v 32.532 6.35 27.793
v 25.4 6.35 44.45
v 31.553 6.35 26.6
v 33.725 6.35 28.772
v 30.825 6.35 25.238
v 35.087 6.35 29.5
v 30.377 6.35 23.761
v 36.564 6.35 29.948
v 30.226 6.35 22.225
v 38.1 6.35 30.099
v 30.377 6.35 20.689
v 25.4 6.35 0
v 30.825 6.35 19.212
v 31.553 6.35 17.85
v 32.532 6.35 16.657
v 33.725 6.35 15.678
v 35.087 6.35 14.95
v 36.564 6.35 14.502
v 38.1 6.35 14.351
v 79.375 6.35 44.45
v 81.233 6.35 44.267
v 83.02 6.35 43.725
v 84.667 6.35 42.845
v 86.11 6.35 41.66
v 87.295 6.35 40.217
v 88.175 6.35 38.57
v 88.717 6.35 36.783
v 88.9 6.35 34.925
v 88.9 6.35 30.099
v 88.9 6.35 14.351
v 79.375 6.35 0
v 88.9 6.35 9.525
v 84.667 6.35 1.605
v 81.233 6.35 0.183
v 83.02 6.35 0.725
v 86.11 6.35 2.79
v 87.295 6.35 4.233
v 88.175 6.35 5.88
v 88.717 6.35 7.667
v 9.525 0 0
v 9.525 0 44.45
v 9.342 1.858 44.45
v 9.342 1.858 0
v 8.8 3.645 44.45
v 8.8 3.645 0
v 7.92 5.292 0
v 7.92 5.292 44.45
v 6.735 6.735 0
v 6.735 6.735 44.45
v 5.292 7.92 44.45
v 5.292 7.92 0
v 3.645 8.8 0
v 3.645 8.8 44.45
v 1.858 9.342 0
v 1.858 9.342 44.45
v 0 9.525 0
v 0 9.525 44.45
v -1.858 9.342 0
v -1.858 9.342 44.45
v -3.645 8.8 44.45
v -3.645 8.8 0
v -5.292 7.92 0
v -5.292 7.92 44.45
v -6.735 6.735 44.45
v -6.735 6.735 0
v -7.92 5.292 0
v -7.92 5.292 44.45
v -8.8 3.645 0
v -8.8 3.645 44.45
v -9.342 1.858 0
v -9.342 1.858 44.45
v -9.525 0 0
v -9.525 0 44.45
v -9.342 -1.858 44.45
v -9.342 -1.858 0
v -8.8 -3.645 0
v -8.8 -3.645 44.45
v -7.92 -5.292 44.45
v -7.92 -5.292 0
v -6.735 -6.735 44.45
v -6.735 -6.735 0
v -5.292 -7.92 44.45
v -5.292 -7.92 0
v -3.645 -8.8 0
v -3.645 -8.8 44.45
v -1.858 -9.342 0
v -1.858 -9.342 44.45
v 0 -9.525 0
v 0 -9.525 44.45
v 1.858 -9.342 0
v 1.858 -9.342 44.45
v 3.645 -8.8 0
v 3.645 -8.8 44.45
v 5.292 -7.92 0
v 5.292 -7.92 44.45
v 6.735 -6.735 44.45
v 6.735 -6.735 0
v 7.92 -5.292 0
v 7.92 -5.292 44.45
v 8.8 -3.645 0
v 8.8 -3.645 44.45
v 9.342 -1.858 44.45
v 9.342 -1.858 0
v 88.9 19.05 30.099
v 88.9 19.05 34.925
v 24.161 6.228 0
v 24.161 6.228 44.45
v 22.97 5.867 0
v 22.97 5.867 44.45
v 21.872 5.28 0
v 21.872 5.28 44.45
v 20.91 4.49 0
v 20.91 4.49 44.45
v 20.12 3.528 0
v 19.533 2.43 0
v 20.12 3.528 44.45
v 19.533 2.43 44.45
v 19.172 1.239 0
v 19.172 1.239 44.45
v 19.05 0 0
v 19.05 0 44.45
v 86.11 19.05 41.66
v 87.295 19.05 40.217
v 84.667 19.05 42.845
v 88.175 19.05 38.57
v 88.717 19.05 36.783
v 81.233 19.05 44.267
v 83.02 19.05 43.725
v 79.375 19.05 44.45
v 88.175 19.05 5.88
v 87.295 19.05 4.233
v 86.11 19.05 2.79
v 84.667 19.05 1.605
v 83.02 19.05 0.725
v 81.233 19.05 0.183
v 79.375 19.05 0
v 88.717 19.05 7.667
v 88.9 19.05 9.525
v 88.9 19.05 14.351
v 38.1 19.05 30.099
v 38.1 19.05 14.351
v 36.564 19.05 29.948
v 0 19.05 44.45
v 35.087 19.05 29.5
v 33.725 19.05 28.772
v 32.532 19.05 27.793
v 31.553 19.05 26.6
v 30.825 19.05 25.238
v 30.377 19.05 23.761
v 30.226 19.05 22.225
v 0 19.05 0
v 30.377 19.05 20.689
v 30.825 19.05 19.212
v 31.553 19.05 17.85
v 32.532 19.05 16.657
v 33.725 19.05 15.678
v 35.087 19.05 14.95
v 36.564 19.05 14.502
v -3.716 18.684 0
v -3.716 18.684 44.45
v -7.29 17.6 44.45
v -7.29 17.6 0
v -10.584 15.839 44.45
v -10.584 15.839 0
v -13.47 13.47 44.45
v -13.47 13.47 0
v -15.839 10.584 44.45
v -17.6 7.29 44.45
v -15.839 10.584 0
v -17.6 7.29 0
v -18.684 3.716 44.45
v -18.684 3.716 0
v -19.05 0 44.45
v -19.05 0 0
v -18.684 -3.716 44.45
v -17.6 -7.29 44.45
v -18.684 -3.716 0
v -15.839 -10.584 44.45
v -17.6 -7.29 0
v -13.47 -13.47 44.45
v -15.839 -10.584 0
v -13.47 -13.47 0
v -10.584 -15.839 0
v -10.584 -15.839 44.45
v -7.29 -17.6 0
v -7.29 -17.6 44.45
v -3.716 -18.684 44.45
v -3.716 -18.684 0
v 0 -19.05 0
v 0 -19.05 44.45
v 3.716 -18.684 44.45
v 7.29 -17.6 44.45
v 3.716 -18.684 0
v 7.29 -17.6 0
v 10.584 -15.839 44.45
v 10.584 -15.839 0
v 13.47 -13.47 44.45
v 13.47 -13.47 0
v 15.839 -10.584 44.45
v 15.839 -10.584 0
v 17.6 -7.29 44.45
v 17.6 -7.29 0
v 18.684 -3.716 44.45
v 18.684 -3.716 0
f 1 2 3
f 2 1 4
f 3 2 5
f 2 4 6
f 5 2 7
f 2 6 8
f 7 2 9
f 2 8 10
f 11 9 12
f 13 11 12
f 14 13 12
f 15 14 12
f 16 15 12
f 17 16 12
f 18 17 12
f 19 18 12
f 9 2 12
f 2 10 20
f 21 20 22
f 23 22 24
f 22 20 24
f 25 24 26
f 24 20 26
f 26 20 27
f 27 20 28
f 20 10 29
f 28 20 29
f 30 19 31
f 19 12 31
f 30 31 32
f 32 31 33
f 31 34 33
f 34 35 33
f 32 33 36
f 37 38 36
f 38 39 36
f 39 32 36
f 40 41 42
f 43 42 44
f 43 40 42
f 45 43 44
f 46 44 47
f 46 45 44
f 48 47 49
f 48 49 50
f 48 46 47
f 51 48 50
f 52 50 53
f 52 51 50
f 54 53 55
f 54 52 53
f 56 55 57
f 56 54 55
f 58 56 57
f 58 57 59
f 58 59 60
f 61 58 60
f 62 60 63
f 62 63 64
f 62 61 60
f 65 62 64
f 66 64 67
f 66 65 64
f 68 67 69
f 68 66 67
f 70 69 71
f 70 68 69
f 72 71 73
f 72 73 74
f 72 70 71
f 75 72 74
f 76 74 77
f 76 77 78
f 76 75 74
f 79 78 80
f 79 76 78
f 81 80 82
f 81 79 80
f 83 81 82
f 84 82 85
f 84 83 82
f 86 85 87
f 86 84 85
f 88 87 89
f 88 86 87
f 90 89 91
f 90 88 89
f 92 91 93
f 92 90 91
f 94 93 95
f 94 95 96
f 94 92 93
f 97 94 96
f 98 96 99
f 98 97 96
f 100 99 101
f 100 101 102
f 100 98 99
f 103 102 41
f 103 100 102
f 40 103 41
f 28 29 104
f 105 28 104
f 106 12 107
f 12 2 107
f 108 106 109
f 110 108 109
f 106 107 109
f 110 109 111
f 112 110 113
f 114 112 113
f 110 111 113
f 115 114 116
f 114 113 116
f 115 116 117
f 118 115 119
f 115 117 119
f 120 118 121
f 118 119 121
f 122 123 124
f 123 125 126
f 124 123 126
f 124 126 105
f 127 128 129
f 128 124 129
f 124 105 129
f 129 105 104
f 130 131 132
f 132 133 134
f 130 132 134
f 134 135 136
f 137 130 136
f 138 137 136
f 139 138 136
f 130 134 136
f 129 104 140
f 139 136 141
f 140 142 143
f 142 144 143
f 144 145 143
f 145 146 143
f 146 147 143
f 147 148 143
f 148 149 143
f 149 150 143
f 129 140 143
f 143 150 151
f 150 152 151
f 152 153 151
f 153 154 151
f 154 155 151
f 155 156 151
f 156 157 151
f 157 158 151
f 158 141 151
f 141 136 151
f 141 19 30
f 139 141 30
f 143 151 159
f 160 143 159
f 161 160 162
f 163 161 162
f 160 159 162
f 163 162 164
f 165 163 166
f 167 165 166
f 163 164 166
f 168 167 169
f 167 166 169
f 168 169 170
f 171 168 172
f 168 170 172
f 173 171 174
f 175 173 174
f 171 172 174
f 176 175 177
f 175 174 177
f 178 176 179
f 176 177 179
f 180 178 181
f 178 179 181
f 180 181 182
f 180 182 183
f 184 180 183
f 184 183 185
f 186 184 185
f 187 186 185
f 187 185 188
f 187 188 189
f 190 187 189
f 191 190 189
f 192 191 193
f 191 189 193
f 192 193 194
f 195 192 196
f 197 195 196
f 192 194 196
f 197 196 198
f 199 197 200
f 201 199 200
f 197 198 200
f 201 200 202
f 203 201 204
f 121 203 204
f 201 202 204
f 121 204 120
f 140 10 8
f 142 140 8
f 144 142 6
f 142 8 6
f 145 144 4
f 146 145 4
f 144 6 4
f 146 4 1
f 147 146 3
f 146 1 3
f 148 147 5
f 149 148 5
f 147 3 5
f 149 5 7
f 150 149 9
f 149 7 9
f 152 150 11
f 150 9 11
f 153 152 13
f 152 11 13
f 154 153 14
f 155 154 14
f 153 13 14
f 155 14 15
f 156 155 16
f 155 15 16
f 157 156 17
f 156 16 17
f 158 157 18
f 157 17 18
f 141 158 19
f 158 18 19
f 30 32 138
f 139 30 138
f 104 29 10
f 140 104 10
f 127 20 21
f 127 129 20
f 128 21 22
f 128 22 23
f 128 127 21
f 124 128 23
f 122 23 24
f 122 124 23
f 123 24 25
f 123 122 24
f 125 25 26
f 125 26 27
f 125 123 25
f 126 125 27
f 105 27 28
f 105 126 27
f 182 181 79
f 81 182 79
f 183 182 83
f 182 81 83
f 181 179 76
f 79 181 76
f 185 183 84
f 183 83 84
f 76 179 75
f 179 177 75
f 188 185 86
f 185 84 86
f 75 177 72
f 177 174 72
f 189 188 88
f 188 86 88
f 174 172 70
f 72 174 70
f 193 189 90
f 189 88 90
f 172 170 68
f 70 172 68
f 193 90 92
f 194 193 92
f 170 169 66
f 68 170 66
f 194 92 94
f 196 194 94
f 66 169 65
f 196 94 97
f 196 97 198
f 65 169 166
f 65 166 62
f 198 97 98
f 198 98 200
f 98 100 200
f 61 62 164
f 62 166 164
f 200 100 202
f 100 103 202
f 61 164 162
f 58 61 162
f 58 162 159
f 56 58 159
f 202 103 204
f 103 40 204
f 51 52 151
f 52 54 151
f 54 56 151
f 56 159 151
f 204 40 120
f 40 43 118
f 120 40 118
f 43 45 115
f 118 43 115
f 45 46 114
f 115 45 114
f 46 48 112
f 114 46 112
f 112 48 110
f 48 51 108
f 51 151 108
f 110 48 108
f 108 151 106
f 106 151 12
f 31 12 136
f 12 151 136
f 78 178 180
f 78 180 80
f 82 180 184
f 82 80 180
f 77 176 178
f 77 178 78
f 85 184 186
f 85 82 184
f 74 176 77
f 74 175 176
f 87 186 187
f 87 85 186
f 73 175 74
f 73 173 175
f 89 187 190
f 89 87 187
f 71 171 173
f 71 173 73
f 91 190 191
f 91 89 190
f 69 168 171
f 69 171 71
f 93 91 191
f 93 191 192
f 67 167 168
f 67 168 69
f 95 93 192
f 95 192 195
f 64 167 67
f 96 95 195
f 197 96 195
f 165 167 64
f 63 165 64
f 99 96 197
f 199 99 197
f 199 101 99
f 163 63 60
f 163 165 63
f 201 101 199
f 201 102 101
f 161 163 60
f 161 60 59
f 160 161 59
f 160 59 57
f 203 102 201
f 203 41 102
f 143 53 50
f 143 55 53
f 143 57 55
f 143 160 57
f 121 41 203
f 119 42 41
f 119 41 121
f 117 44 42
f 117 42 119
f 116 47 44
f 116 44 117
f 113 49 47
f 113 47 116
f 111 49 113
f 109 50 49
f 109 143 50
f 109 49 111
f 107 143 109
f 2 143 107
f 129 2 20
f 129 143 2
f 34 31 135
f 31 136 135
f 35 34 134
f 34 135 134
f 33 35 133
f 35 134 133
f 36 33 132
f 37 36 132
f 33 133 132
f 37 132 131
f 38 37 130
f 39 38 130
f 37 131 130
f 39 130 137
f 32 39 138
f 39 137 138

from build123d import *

# Parameters (mm, degrees)
F0_R     = 9.525
F1_DEPTH = 44.45
F3_DEPTH = 12.701
F4_R     = 6.34999
F5_R     = 9.525


# Not quite as in the source:
# - a fillet or chamfer is up to 0.001 mm smaller than in the source, because OpenCascade refuses the exact size


with BuildPart() as f1:
    # F0 (on Top) → F1 (new body)
    with BuildSketch(Plane.XY):
        with BuildLine():
            Line((88.9, 19.05), (0, 19.05))
            ThreePointArc((0, 19.05), (-13.4703841816, -13.4703841816), (19.05, 0))
            Line((19.05, 0), (19.05, 6.35))
            Line((19.05, 6.35), (88.9, 6.35))
            Line((88.9, 6.35), (88.9, 19.05))
        make_face()
        Circle(F0_R, mode=Mode.SUBTRACT)
    extrude(amount=F1_DEPTH)

    # F2 (on face) → F3 (cut, through all)
    with BuildSketch(Plane.XZ.offset(-6.35)):
        with BuildLine():
            Line((88.9, 30.099), (38.1, 30.099))
            ThreePointArc((38.1, 30.099), (30.226, 22.225), (38.1, 14.351))
            Line((38.1, 14.351), (88.9, 14.351))
            Line((88.9, 14.351), (88.9, 30.099))
        make_face()
    extrude(amount=-F3_DEPTH, mode=Mode.SUBTRACT)

    # F4 (radius 6.35 in the source; OpenCascade refuses exactly that, so slightly less here)
    f4_edges = [f1.edges().sort_by_distance(p)[0] for p in [
        (19.05, 6.35, 22.225),
    ]]
    fillet(f4_edges, radius=F4_R)

    # F5
    f5_edges = [f1.edges().sort_by_distance(p)[0] for p in [
        (88.9, 12.7, 0),
        (88.9, 12.7, 44.45),
    ]]
    fillet(f5_edges, radius=F5_R)


solid = f1.part
